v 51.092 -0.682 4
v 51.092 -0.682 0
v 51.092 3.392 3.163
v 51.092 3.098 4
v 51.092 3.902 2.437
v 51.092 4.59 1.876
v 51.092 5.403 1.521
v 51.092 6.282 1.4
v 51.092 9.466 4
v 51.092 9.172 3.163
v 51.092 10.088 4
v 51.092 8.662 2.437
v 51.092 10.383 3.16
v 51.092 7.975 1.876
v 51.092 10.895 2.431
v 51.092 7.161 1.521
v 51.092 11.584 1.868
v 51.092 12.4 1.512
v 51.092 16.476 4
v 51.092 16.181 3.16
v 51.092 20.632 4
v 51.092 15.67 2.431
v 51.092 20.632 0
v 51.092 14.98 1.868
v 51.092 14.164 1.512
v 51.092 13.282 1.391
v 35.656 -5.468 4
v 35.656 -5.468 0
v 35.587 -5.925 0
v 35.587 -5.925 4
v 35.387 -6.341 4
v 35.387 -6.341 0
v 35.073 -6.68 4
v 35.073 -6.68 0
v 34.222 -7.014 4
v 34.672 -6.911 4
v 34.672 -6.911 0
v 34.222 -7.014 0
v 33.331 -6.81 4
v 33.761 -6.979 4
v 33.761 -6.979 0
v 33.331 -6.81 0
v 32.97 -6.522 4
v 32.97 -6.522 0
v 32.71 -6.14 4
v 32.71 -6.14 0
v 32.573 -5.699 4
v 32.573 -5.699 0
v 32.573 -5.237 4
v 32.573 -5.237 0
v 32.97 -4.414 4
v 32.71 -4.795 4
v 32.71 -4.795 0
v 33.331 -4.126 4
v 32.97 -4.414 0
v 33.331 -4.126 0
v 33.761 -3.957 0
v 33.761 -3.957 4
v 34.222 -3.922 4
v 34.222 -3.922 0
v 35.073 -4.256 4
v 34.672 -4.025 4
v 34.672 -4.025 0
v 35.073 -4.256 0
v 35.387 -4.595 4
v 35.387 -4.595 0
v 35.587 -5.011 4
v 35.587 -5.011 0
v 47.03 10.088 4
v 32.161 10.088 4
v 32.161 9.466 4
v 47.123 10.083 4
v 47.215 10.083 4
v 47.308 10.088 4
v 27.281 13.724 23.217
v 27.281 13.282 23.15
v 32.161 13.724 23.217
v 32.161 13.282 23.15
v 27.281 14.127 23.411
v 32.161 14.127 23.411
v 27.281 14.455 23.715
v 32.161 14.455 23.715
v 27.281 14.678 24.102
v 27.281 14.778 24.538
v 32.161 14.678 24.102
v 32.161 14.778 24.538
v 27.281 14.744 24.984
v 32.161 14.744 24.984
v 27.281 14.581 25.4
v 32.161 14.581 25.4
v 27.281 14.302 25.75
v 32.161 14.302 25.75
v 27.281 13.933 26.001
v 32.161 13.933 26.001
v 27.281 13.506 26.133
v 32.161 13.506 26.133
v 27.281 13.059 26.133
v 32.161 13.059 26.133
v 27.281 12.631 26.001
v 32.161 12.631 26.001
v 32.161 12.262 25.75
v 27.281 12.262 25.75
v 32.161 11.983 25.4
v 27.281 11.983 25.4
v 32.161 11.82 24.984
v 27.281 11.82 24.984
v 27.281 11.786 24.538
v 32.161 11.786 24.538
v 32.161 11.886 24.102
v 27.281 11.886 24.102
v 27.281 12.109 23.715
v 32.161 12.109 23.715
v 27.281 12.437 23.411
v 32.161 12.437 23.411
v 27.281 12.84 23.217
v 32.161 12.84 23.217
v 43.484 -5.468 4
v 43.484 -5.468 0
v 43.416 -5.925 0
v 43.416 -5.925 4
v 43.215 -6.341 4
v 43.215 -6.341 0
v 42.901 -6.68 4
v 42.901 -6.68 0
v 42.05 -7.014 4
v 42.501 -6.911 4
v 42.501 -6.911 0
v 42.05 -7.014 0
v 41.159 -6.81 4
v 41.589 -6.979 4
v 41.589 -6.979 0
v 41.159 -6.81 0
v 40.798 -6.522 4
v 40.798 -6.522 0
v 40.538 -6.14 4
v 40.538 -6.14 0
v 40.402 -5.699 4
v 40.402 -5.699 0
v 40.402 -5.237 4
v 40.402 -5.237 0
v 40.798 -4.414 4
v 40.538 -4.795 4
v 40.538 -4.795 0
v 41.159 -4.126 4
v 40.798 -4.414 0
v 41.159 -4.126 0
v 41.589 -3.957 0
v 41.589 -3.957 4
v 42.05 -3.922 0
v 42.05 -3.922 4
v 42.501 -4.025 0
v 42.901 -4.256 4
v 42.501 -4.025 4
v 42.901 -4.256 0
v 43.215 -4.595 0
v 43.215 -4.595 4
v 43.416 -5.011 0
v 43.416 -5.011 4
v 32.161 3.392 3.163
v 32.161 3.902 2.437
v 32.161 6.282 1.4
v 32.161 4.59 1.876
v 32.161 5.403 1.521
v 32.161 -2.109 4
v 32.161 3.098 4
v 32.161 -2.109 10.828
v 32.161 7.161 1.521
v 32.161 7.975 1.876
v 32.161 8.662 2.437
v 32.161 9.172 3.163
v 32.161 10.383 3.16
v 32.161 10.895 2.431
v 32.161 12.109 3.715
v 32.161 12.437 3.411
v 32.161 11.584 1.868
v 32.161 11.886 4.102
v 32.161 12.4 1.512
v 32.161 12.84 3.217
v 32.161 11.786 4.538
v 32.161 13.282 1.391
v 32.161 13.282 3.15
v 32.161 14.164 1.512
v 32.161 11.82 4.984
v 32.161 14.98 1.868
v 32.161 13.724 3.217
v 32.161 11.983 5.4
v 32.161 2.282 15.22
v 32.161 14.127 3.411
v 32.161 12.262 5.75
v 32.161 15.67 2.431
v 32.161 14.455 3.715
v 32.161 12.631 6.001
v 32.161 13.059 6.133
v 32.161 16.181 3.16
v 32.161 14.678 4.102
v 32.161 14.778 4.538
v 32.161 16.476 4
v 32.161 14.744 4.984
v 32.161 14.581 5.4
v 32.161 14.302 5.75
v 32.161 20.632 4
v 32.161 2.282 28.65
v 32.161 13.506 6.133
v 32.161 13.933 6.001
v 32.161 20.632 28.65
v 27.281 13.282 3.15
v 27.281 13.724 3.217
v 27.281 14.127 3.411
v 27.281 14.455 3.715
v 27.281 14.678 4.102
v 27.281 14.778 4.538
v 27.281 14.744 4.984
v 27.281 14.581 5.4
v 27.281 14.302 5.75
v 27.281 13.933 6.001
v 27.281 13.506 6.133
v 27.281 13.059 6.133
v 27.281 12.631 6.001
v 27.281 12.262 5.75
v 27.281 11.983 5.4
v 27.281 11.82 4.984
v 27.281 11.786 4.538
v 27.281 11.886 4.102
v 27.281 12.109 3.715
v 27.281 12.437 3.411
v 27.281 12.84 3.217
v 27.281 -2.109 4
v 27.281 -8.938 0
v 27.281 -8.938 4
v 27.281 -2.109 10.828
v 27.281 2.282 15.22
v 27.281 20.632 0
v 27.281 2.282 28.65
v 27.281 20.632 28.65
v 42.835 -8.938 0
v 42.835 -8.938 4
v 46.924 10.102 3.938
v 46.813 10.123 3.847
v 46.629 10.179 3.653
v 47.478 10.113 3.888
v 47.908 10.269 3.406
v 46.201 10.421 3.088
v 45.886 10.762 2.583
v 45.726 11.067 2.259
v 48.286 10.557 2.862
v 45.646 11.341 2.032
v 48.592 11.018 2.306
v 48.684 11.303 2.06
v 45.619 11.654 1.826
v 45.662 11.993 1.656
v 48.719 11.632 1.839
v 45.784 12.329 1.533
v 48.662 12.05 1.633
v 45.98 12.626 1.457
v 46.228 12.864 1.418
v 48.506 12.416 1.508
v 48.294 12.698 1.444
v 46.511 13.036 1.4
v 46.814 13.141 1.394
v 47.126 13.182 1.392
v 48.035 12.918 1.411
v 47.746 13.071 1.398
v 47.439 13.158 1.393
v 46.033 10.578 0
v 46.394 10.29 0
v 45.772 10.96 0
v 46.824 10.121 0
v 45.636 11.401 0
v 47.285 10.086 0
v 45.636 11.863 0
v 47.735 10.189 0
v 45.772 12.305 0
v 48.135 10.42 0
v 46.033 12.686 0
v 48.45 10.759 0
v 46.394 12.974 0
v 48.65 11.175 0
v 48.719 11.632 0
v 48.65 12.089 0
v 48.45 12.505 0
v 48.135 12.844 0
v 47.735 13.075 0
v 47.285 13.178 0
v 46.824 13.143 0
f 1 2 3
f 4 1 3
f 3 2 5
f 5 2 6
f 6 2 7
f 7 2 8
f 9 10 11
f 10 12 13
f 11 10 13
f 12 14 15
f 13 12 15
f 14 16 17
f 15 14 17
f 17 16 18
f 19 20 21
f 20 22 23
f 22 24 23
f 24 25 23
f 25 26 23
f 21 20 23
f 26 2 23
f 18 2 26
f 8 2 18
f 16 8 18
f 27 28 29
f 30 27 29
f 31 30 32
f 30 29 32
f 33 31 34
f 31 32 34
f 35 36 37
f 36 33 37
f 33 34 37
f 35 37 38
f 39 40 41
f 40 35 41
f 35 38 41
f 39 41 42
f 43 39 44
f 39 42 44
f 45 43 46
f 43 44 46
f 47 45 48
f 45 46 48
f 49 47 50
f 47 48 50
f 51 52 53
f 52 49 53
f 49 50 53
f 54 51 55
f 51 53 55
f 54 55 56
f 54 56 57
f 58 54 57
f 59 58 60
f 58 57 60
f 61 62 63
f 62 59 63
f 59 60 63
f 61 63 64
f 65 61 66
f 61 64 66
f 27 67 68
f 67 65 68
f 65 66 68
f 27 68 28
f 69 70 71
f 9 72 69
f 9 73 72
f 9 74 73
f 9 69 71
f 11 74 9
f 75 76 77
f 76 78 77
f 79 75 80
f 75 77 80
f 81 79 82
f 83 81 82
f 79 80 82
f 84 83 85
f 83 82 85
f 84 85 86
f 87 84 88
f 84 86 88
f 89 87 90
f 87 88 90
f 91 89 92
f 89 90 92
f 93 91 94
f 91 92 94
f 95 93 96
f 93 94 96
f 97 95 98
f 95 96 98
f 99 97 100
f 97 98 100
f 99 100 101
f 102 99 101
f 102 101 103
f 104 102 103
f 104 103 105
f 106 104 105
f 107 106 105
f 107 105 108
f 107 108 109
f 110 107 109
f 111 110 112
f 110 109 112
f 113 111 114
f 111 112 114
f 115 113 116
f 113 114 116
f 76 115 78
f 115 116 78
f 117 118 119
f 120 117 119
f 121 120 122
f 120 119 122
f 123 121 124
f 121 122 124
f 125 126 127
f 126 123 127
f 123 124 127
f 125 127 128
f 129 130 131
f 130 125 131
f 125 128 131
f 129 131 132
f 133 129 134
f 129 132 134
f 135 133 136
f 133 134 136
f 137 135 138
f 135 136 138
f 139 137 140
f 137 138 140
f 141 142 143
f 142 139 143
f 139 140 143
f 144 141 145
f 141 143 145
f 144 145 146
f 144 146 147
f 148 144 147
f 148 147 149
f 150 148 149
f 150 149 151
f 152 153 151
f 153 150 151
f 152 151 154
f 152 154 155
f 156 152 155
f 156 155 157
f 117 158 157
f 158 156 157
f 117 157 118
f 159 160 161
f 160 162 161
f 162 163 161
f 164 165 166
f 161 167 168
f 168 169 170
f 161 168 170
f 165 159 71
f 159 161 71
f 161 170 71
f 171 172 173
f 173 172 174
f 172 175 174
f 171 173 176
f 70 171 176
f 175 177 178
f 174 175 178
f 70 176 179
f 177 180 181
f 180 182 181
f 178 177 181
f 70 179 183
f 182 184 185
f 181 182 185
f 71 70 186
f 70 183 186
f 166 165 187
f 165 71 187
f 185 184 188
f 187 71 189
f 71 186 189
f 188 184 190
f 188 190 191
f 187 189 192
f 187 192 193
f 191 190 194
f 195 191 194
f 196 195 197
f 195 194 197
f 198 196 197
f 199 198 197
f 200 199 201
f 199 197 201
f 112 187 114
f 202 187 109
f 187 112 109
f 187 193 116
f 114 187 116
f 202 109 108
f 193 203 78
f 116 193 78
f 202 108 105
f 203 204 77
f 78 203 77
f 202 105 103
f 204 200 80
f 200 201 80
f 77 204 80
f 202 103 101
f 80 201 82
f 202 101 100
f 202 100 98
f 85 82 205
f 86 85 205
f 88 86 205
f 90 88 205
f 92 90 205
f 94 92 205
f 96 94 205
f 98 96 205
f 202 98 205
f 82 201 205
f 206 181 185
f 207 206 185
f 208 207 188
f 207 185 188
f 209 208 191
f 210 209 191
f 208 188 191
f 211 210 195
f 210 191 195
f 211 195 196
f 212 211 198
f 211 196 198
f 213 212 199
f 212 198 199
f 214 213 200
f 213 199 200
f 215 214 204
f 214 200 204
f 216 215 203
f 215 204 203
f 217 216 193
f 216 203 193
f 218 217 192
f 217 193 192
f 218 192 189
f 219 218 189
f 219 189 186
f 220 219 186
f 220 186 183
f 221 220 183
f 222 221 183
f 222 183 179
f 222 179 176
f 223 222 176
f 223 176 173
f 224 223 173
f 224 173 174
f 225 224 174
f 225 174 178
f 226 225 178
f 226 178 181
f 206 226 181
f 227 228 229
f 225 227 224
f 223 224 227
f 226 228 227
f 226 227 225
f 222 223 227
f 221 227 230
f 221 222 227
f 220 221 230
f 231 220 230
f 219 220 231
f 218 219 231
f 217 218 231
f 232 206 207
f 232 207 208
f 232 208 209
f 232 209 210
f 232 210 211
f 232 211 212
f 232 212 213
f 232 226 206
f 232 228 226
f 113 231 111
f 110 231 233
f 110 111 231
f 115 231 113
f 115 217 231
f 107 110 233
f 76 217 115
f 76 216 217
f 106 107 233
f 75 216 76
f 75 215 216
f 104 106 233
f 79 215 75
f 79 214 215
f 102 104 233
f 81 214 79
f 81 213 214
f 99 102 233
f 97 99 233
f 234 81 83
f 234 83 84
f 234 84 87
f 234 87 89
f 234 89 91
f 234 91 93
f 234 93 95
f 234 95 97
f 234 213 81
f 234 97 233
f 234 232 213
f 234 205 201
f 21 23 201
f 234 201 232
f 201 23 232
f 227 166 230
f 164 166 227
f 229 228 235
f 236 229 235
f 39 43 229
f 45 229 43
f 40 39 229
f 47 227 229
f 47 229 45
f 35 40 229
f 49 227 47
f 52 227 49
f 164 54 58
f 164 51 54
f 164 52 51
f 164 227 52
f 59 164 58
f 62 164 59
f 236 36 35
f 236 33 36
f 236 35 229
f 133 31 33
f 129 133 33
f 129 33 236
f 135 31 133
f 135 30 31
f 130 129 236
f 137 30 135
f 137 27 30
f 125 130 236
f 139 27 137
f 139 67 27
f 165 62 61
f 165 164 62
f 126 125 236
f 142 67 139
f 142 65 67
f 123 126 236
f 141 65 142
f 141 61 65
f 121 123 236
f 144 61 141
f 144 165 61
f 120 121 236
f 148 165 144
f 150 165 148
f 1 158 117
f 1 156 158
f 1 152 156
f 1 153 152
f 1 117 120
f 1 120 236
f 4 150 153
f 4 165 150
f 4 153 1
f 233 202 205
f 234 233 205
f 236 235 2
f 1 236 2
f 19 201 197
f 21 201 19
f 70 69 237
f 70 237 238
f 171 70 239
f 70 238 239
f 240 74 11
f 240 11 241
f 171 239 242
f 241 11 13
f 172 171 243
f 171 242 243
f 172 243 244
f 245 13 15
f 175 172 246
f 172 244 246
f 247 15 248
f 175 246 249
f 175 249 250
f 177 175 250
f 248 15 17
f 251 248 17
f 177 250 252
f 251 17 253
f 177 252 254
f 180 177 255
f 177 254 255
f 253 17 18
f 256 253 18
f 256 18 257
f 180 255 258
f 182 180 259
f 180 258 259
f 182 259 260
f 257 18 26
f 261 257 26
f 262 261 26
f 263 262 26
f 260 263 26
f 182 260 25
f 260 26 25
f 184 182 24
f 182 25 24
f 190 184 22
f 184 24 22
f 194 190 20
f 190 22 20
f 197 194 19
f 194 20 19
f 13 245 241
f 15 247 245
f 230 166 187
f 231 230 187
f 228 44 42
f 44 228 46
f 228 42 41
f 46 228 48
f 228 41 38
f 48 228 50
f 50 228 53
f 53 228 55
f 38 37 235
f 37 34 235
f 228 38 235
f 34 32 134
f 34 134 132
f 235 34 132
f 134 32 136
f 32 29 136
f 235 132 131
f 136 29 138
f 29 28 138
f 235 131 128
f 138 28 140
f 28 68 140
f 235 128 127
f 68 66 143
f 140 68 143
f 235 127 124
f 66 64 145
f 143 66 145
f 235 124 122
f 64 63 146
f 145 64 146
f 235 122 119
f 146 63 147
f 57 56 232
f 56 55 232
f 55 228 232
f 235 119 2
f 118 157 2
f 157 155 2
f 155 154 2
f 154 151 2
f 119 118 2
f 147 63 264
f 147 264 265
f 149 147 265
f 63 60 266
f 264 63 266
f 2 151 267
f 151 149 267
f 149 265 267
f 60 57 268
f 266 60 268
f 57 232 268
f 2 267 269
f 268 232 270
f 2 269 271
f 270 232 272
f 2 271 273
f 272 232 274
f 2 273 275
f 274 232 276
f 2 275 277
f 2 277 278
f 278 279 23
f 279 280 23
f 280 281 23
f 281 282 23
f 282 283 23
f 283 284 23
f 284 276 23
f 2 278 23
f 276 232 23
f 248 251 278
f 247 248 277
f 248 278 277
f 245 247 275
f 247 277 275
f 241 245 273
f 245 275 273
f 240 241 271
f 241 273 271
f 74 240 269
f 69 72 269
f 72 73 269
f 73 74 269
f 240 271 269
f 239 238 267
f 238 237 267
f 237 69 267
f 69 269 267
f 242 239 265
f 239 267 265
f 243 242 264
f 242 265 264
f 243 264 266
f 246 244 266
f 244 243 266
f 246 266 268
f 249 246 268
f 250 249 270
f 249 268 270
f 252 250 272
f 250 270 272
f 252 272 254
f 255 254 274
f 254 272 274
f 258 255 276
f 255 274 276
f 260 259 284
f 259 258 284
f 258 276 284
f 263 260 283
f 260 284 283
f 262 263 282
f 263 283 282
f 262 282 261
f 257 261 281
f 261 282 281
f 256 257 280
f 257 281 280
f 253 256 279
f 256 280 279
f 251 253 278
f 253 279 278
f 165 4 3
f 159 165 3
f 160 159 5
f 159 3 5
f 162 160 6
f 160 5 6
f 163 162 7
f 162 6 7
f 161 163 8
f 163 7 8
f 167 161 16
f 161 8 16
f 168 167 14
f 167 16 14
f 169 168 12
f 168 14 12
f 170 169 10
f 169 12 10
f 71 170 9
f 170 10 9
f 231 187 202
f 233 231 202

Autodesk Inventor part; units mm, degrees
ref_plane "YZ Plane" through (0, 0, 0) normal (1, 0, 0) x (0, 1, 0)
ref_plane "XZ Plane" through (0, 0, 0) normal (0, 1, 0) x (-1, 0, 0)
ref_plane "Work Plane1" through (0, 0, 0) normal (0, 0, 1) x (1, 0, 0)
sketch "Sketch1" plane through (0, 0, 0) normal (0, 0, 1) x (1, 0, 0)
  circle A0 centre (2.6061, 6.2821) radius 1.5 construction
  circle A1 centre (22.6061, 6.2821) radius 1.5 construction
  line L0 (-2.6427, 15.6321) -> (-2.6427, -2.7179) construction
  line L1 (-2.6427, -2.7179) -> (30.1061, -2.7179) construction
  line L2 (30.1061, -2.7179) -> (30.1061, -39.6443) construction
  line L3 (30.1061, -39.6443) -> (66.9651, 7.5331) construction
  line L4 (66.9651, 7.5331) -> (66.9651, 15.6321) construction
  line L5 (66.9651, 15.6321) -> (-2.6427, 15.6321) construction
  circle A2 centre (12.3511, 11.6321) radius 1.45 construction
  circle A3 centre (41.9344, -5.4679) radius 1.45 construction
  circle A4 centre (34.1061, -5.4679) radius 1.45 construction
  circle A5 centre (54.6178, 11.6321) radius 1.45 construction
  circle A6 centre (-0.6427, 11.6823) radius 1.45 construction
  circle A7 centre (29.5857, 11.6321) radius 1.45 construction
  circle A8 centre (51.7579, -5.4342) radius 1.45 construction
  circle A9 centre (34.1061, -24.4536) radius 1.45 construction
  circle A10 centre (47.169, 11.6321) radius 1.45 construction
  line L6 (-7.0605, -146.6377) -> (1.2368, -137.4227) construction
  line L7 (-28.8718, -126.9987) -> (-20.5745, -117.7837) construction
  line L8 (32.1612, -8.9378) -> (42.8353, -8.9378)
  line L9 (42.8353, -8.9378) -> (51.0915, -0.6816)
  line L10 (51.0915, -0.6816) -> (51.0915, 15.6321)
  line L11 (32.1612, -8.9378) -> (32.1612, 15.6321)
  line L12 (32.1612, 15.6321) -> (51.0915, 15.6321)
  circle A11 centre (34.1061, -5.4679) radius 1.55
  circle A12 centre (41.9344, -5.4679) radius 1.55
  circle A13 centre (47.169, 11.6321) radius 1.55
  line L13 (32.1612, 15.6321) -> (51.0915, 15.6321)
  line L14 (51.0915, 15.6321) -> (51.0915, 20.6321)
  line L15 (51.0915, 20.6321) -> (32.1612, 20.6321)
  line L16 (32.1612, 20.6321) -> (32.1612, 15.6321)
  point P0 (0, 0)
  dimension "d0" = 135
  dimension "d1" = 3.1
  dimension "d2" = 3.1
  dimension "d3" = 3.1
  dimension "d16" = 5
extrude "Extrusion1" add sketch "Sketch1" along normal blind 4
sketch "Sketch2" plane through (32.1612, -8.9378, 0) normal (-1, 0, 0) x (0, 0, 1)
  line L0 (0, 0) -> (0, 29.5699) projected
  line L1 (0, 0) -> (4, 0) projected
  line L2 (4, 29.5699) -> (4, 0) projected
  line L3 (10.8285, 6.8285) -> (15.2199, 11.2199)
  line L4 (15.2199, 11.2199) -> (28.65, 11.2199)
  line L5 (28.65, 11.2199) -> (28.65, 29.5699)
  line L6 (28.65, 29.5699) -> (0, 29.5699)
  line L7 (10.8285, 6.8285) -> (0, 6.8285)
  line L8 (0, 0) -> (0, 8.2562) projected
  line L9 (0, 29.5699) -> (4, 29.5699) projected
  ellipse E0 centre (24.65, -131.1602) end of major axis (23.05, -131.1602) minor radius 1.189 projected
  ellipse E1 centre (4.65, -131.1602) end of major axis (3.05, -131.1602) minor radius 1.189 projected
  point P0 (0, 8.9378)
  point P1 (0, 6.2199)
  dimension "d8" = 45
ref_plane "Work Plane2" through (27.2811, 2.682, 0.7251) normal (1, 0, 0) x (0, 1, 0)
extrude "Extrusion2" add sketch "Sketch2" along normal up to surface (4.8801 mm away) contours L0 L7 L2 L1 | L0 L6 L2 L7 | L2 L6 L5 L4 L3 L7
sketch "Sketch3" plane through (51.0915, -0.6816, 0) normal (1, 0, 0) x (0, 0, -1)
  circle A0 centre (-24.65, 13.9637) radius 1.5
  circle A1 centre (-4.65, 13.9637) radius 1.5
  ellipse E0 centre (-4.65, -139.4164) end of major axis (-3.05, -139.4164) minor radius 1.189 projected
  ellipse E1 centre (-24.65, -139.4164) end of major axis (-23.05, -139.4164) minor radius 1.189 projected
  point P0 (0, 0.6816)
  dimension "d17" = 3
  dimension "d18" = 3
extrude "Extrusion3" cut sketch "Sketch3" against normal through all
sketch "Sketch4" plane through (51.0915, -0.6816, 0) normal (1, 0, 0) x (0, 0, -1)
  arc A0 (-4, 5.5016) -> (-4, 8.4257) centre (-4.65, 6.9637) ccw projected
  circle A1 centre (-4.65, 6.9637) radius 3.25
  arc A2 (-4, 12.6118) -> (-4, 15.3155) centre (-4.65, 13.9637) ccw projected
  circle A3 centre (-4.65, 13.9637) radius 3.2592
  point P0 (0, 0.6816)
  dimension "d13" = 6.5
extrude "Extrusion4" cut sketch "Sketch4" against normal up to surface (18.9303 mm away)
properties part number "cellSTORM_alviumadapter"
